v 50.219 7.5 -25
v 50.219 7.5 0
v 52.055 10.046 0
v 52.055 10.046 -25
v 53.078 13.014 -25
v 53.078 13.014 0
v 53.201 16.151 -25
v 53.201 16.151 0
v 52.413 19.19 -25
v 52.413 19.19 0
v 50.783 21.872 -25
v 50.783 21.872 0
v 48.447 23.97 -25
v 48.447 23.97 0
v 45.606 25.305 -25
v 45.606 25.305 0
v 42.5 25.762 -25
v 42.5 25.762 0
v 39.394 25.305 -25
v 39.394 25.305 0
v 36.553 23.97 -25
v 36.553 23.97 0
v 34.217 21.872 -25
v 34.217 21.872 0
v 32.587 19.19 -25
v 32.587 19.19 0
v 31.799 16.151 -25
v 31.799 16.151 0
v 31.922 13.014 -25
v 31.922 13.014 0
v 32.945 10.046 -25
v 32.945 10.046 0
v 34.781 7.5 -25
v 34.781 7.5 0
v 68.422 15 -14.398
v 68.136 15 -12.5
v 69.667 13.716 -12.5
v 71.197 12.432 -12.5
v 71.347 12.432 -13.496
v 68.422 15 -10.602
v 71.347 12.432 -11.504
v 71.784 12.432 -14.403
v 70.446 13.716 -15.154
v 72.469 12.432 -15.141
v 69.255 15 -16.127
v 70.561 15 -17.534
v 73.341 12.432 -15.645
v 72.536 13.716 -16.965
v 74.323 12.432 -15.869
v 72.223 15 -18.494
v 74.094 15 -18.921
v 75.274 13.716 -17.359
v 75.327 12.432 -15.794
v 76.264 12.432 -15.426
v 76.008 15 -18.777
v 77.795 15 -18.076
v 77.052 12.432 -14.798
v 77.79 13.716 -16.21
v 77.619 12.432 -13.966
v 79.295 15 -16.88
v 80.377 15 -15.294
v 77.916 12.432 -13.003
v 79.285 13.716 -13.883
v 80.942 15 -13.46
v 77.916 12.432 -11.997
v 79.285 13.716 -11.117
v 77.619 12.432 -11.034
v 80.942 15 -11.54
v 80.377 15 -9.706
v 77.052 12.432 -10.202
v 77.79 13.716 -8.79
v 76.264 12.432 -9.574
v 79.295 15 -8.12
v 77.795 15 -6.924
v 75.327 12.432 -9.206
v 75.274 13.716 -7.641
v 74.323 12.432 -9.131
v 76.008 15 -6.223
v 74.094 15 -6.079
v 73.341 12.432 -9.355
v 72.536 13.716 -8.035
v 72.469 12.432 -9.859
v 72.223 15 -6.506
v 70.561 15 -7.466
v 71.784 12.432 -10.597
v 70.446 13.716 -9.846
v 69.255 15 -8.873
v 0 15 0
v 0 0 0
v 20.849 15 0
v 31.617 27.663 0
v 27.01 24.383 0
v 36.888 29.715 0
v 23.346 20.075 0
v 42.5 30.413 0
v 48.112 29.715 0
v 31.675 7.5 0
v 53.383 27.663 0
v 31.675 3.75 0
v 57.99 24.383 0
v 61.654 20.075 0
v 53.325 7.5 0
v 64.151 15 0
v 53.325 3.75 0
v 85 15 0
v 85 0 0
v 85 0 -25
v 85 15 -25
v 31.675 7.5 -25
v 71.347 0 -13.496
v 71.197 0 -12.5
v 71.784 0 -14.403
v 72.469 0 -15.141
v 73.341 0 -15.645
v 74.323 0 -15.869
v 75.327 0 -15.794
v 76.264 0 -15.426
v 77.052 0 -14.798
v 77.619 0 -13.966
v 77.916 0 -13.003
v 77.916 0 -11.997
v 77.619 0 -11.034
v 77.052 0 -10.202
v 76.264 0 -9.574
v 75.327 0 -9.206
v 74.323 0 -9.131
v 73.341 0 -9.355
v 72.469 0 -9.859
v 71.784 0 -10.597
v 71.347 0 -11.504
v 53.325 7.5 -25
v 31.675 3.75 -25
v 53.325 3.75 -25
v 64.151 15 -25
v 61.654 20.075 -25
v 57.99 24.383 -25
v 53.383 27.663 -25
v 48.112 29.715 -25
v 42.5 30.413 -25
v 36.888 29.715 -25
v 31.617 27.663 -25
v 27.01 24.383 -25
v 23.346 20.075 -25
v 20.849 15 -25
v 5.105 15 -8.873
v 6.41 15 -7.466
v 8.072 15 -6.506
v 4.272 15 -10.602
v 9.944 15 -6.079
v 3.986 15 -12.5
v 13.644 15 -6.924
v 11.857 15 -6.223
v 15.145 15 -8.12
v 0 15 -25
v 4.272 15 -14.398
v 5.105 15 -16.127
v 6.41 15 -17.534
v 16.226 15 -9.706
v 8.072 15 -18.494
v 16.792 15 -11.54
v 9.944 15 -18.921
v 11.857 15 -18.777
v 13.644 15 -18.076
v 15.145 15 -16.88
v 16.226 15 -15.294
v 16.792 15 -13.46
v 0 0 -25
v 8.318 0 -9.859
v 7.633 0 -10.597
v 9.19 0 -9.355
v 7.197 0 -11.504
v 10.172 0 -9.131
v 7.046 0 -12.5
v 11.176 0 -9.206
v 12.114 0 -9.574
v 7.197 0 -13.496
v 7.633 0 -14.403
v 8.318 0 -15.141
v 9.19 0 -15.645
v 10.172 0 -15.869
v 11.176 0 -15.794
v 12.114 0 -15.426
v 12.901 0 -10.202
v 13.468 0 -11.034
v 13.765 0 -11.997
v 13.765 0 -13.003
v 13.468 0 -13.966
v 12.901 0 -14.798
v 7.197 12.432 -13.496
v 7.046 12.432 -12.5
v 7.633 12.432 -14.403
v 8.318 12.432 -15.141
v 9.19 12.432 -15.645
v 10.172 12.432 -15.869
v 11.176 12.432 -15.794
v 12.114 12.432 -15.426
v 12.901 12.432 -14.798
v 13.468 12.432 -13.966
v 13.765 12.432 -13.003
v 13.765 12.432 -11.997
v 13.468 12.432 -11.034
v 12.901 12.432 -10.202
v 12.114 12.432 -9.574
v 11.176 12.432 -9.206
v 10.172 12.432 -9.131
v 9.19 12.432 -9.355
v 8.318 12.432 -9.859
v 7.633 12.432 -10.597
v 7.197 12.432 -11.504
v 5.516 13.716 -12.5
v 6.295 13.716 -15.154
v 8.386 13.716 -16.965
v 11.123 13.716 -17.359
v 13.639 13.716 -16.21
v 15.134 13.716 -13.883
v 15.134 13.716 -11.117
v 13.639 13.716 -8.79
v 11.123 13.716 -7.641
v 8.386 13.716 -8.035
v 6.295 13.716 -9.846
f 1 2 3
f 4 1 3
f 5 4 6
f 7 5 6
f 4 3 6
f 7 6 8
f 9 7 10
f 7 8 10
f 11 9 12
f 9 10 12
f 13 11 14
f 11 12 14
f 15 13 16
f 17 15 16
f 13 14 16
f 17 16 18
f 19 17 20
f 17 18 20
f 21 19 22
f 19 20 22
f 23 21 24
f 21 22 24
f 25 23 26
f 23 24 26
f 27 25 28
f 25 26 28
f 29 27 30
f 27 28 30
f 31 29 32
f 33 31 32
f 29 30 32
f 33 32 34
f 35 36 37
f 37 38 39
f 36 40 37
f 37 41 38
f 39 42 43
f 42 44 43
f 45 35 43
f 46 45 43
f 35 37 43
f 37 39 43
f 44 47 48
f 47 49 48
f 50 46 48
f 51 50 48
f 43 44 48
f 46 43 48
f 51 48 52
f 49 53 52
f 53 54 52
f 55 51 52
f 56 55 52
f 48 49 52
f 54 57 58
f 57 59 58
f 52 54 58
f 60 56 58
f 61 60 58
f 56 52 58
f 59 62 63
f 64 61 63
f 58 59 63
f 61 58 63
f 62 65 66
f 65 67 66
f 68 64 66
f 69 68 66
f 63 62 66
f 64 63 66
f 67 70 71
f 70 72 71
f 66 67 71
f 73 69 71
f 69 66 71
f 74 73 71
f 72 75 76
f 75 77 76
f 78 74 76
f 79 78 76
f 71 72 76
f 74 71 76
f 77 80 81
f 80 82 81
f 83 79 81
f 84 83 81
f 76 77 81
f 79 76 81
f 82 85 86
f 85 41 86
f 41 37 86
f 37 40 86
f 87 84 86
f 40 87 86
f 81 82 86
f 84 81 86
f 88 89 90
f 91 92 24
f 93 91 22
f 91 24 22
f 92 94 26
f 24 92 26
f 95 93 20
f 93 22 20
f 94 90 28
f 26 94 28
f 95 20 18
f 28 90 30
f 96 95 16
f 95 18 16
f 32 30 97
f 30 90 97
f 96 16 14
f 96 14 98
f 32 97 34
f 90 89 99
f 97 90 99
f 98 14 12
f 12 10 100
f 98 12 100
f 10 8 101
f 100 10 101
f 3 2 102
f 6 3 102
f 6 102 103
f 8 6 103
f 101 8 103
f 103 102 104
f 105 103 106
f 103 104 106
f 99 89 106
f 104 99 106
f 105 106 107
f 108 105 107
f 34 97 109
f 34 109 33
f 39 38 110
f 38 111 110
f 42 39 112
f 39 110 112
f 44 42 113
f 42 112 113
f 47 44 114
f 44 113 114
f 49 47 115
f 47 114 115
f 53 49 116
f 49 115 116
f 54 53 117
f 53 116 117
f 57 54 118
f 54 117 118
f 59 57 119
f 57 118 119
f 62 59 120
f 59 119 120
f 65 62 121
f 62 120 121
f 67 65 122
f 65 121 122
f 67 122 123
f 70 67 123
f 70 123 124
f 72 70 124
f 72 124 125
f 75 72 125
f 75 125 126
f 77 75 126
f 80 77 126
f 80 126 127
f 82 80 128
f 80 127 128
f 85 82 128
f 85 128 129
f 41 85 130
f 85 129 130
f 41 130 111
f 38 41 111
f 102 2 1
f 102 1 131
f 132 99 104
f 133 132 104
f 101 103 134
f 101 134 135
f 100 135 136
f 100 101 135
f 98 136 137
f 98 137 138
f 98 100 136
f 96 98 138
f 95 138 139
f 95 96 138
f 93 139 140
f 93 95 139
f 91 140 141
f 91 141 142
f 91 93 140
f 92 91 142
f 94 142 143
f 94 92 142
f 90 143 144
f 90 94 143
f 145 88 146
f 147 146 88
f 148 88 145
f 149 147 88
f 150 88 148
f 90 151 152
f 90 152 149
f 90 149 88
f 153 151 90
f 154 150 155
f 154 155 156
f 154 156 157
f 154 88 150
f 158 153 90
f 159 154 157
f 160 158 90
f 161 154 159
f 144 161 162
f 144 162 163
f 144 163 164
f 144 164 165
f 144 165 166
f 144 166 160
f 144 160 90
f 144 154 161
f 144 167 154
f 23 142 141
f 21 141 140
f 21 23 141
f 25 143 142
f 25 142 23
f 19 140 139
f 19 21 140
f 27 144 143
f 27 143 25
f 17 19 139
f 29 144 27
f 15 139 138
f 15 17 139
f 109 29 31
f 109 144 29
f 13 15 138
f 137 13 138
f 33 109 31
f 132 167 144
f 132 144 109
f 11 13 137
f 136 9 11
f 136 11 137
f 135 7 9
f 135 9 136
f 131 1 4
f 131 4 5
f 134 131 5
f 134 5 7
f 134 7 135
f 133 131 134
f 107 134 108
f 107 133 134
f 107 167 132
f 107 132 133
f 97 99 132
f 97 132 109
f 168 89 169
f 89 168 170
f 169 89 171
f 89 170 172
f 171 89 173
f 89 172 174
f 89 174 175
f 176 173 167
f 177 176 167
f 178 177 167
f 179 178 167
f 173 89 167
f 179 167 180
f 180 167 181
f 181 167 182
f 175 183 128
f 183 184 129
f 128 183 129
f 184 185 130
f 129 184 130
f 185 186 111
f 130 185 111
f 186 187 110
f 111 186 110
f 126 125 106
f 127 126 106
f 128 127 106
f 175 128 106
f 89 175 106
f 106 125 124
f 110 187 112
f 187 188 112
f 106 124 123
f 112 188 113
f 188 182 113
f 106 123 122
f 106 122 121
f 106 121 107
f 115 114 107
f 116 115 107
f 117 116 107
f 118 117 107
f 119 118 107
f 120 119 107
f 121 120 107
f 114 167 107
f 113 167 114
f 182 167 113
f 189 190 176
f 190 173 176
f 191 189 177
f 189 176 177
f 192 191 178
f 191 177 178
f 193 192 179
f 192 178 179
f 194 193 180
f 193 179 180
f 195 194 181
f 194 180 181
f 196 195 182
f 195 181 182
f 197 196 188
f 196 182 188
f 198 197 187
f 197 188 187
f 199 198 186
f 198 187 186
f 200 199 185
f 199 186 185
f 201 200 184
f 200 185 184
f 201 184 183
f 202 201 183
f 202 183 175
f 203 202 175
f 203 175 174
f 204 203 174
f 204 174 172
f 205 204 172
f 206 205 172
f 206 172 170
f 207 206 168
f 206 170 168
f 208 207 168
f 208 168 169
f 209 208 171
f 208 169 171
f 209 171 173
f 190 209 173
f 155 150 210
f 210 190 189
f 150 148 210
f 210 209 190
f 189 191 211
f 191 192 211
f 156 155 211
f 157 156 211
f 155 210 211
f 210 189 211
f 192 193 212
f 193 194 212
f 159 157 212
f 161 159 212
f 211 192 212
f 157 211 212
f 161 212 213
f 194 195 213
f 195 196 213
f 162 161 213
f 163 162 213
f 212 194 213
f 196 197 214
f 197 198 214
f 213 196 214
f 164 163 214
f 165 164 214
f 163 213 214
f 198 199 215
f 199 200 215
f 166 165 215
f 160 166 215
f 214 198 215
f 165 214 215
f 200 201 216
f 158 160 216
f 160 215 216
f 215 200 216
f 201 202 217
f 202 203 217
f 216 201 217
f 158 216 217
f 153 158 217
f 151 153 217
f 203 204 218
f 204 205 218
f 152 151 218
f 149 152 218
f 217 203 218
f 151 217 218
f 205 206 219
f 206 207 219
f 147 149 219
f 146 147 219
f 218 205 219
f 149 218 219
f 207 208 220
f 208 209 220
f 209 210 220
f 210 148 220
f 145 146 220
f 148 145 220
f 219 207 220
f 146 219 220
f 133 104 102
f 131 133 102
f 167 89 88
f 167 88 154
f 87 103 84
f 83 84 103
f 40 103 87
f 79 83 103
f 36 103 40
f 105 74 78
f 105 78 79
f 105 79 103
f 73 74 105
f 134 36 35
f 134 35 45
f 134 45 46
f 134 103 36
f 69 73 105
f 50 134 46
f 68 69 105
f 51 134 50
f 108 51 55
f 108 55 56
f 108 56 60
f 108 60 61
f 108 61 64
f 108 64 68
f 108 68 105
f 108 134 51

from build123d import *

# Parameters (mm, degrees)
SKETCH2_W                                           = 85
SKETCH2_H                                           = 25
BOSS_EXTRUDE1_DEPTH                                 = 15
BOSS_EXTRUDE3_DEPTH                                 = 25
CSK_FOR_1_4_FLAT_HEAD_MACHINE_SCREW_100_D           = 6.7564
CSK_FOR_1_4_FLAT_HEAD_MACHINE_SCREW_100_CSINK_D     = 12.8778
CSK_FOR_1_4_FLAT_HEAD_MACHINE_SCREW_100_CSINK_ANGLE = 100
CUT_EXTRUDE1_DEPTH                                  = 55


with BuildPart() as part:
    # Sketch2 → Boss-Extrude1 (new body)
    with BuildSketch(Plane(origin=(0, 0, 0), x_dir=(1, 0, 0), z_dir=(0, 1, 0))):
        with Locations((42.5, 12.5)):
            Rectangle(SKETCH2_W, SKETCH2_H)
    extrude(amount=BOSS_EXTRUDE1_DEPTH)

    # Sketch6 → Boss-Extrude3 (add)
    with BuildSketch(Plane.XY):
        with BuildLine():
            Line((20.849364905, 15), (64.150635095, 15))
            ThreePointArc((64.150635095, 15), (42.5, 30.412878475), (20.849364905, 15))
        make_face()
    extrude(amount=-BOSS_EXTRUDE3_DEPTH)

    # CSK for 1/4 Flat Head Machine Screw (100)1 (through all)
    with Locations(Plane(origin=(0, 15, 0), x_dir=(1, 0, 0), z_dir=(0, 1, 0))):
        with Locations((74.575317547, 12.5), (10.424682453, 12.5)):
            CounterSinkHole(CSK_FOR_1_4_FLAT_HEAD_MACHINE_SCREW_100_D / 2, CSK_FOR_1_4_FLAT_HEAD_MACHINE_SCREW_100_CSINK_D / 2, counter_sink_angle=CSK_FOR_1_4_FLAT_HEAD_MACHINE_SCREW_100_CSINK_ANGLE)

    # Sketch7 → Cut-Extrude1 (cut)
    with BuildSketch(Plane.XY):
        with BuildLine():
            Line((53.325317547, 3.75), (53.325317547, 7.5))
            Line((53.325317547, 7.5), (50.218877835, 7.5))
            ThreePointArc((50.218877835, 7.5), (42.5, 25.762484612), (34.781122165, 7.5))
            Line((34.781122165, 7.5), (31.674682453, 7.5))
            Line((31.674682453, 7.5), (31.674682453, 3.75))
            Line((31.674682453, 3.75), (53.325317547, 3.75))
        make_face()
    extrude(amount=-CUT_EXTRUDE1_DEPTH, mode=Mode.SUBTRACT)


solid = part.part
